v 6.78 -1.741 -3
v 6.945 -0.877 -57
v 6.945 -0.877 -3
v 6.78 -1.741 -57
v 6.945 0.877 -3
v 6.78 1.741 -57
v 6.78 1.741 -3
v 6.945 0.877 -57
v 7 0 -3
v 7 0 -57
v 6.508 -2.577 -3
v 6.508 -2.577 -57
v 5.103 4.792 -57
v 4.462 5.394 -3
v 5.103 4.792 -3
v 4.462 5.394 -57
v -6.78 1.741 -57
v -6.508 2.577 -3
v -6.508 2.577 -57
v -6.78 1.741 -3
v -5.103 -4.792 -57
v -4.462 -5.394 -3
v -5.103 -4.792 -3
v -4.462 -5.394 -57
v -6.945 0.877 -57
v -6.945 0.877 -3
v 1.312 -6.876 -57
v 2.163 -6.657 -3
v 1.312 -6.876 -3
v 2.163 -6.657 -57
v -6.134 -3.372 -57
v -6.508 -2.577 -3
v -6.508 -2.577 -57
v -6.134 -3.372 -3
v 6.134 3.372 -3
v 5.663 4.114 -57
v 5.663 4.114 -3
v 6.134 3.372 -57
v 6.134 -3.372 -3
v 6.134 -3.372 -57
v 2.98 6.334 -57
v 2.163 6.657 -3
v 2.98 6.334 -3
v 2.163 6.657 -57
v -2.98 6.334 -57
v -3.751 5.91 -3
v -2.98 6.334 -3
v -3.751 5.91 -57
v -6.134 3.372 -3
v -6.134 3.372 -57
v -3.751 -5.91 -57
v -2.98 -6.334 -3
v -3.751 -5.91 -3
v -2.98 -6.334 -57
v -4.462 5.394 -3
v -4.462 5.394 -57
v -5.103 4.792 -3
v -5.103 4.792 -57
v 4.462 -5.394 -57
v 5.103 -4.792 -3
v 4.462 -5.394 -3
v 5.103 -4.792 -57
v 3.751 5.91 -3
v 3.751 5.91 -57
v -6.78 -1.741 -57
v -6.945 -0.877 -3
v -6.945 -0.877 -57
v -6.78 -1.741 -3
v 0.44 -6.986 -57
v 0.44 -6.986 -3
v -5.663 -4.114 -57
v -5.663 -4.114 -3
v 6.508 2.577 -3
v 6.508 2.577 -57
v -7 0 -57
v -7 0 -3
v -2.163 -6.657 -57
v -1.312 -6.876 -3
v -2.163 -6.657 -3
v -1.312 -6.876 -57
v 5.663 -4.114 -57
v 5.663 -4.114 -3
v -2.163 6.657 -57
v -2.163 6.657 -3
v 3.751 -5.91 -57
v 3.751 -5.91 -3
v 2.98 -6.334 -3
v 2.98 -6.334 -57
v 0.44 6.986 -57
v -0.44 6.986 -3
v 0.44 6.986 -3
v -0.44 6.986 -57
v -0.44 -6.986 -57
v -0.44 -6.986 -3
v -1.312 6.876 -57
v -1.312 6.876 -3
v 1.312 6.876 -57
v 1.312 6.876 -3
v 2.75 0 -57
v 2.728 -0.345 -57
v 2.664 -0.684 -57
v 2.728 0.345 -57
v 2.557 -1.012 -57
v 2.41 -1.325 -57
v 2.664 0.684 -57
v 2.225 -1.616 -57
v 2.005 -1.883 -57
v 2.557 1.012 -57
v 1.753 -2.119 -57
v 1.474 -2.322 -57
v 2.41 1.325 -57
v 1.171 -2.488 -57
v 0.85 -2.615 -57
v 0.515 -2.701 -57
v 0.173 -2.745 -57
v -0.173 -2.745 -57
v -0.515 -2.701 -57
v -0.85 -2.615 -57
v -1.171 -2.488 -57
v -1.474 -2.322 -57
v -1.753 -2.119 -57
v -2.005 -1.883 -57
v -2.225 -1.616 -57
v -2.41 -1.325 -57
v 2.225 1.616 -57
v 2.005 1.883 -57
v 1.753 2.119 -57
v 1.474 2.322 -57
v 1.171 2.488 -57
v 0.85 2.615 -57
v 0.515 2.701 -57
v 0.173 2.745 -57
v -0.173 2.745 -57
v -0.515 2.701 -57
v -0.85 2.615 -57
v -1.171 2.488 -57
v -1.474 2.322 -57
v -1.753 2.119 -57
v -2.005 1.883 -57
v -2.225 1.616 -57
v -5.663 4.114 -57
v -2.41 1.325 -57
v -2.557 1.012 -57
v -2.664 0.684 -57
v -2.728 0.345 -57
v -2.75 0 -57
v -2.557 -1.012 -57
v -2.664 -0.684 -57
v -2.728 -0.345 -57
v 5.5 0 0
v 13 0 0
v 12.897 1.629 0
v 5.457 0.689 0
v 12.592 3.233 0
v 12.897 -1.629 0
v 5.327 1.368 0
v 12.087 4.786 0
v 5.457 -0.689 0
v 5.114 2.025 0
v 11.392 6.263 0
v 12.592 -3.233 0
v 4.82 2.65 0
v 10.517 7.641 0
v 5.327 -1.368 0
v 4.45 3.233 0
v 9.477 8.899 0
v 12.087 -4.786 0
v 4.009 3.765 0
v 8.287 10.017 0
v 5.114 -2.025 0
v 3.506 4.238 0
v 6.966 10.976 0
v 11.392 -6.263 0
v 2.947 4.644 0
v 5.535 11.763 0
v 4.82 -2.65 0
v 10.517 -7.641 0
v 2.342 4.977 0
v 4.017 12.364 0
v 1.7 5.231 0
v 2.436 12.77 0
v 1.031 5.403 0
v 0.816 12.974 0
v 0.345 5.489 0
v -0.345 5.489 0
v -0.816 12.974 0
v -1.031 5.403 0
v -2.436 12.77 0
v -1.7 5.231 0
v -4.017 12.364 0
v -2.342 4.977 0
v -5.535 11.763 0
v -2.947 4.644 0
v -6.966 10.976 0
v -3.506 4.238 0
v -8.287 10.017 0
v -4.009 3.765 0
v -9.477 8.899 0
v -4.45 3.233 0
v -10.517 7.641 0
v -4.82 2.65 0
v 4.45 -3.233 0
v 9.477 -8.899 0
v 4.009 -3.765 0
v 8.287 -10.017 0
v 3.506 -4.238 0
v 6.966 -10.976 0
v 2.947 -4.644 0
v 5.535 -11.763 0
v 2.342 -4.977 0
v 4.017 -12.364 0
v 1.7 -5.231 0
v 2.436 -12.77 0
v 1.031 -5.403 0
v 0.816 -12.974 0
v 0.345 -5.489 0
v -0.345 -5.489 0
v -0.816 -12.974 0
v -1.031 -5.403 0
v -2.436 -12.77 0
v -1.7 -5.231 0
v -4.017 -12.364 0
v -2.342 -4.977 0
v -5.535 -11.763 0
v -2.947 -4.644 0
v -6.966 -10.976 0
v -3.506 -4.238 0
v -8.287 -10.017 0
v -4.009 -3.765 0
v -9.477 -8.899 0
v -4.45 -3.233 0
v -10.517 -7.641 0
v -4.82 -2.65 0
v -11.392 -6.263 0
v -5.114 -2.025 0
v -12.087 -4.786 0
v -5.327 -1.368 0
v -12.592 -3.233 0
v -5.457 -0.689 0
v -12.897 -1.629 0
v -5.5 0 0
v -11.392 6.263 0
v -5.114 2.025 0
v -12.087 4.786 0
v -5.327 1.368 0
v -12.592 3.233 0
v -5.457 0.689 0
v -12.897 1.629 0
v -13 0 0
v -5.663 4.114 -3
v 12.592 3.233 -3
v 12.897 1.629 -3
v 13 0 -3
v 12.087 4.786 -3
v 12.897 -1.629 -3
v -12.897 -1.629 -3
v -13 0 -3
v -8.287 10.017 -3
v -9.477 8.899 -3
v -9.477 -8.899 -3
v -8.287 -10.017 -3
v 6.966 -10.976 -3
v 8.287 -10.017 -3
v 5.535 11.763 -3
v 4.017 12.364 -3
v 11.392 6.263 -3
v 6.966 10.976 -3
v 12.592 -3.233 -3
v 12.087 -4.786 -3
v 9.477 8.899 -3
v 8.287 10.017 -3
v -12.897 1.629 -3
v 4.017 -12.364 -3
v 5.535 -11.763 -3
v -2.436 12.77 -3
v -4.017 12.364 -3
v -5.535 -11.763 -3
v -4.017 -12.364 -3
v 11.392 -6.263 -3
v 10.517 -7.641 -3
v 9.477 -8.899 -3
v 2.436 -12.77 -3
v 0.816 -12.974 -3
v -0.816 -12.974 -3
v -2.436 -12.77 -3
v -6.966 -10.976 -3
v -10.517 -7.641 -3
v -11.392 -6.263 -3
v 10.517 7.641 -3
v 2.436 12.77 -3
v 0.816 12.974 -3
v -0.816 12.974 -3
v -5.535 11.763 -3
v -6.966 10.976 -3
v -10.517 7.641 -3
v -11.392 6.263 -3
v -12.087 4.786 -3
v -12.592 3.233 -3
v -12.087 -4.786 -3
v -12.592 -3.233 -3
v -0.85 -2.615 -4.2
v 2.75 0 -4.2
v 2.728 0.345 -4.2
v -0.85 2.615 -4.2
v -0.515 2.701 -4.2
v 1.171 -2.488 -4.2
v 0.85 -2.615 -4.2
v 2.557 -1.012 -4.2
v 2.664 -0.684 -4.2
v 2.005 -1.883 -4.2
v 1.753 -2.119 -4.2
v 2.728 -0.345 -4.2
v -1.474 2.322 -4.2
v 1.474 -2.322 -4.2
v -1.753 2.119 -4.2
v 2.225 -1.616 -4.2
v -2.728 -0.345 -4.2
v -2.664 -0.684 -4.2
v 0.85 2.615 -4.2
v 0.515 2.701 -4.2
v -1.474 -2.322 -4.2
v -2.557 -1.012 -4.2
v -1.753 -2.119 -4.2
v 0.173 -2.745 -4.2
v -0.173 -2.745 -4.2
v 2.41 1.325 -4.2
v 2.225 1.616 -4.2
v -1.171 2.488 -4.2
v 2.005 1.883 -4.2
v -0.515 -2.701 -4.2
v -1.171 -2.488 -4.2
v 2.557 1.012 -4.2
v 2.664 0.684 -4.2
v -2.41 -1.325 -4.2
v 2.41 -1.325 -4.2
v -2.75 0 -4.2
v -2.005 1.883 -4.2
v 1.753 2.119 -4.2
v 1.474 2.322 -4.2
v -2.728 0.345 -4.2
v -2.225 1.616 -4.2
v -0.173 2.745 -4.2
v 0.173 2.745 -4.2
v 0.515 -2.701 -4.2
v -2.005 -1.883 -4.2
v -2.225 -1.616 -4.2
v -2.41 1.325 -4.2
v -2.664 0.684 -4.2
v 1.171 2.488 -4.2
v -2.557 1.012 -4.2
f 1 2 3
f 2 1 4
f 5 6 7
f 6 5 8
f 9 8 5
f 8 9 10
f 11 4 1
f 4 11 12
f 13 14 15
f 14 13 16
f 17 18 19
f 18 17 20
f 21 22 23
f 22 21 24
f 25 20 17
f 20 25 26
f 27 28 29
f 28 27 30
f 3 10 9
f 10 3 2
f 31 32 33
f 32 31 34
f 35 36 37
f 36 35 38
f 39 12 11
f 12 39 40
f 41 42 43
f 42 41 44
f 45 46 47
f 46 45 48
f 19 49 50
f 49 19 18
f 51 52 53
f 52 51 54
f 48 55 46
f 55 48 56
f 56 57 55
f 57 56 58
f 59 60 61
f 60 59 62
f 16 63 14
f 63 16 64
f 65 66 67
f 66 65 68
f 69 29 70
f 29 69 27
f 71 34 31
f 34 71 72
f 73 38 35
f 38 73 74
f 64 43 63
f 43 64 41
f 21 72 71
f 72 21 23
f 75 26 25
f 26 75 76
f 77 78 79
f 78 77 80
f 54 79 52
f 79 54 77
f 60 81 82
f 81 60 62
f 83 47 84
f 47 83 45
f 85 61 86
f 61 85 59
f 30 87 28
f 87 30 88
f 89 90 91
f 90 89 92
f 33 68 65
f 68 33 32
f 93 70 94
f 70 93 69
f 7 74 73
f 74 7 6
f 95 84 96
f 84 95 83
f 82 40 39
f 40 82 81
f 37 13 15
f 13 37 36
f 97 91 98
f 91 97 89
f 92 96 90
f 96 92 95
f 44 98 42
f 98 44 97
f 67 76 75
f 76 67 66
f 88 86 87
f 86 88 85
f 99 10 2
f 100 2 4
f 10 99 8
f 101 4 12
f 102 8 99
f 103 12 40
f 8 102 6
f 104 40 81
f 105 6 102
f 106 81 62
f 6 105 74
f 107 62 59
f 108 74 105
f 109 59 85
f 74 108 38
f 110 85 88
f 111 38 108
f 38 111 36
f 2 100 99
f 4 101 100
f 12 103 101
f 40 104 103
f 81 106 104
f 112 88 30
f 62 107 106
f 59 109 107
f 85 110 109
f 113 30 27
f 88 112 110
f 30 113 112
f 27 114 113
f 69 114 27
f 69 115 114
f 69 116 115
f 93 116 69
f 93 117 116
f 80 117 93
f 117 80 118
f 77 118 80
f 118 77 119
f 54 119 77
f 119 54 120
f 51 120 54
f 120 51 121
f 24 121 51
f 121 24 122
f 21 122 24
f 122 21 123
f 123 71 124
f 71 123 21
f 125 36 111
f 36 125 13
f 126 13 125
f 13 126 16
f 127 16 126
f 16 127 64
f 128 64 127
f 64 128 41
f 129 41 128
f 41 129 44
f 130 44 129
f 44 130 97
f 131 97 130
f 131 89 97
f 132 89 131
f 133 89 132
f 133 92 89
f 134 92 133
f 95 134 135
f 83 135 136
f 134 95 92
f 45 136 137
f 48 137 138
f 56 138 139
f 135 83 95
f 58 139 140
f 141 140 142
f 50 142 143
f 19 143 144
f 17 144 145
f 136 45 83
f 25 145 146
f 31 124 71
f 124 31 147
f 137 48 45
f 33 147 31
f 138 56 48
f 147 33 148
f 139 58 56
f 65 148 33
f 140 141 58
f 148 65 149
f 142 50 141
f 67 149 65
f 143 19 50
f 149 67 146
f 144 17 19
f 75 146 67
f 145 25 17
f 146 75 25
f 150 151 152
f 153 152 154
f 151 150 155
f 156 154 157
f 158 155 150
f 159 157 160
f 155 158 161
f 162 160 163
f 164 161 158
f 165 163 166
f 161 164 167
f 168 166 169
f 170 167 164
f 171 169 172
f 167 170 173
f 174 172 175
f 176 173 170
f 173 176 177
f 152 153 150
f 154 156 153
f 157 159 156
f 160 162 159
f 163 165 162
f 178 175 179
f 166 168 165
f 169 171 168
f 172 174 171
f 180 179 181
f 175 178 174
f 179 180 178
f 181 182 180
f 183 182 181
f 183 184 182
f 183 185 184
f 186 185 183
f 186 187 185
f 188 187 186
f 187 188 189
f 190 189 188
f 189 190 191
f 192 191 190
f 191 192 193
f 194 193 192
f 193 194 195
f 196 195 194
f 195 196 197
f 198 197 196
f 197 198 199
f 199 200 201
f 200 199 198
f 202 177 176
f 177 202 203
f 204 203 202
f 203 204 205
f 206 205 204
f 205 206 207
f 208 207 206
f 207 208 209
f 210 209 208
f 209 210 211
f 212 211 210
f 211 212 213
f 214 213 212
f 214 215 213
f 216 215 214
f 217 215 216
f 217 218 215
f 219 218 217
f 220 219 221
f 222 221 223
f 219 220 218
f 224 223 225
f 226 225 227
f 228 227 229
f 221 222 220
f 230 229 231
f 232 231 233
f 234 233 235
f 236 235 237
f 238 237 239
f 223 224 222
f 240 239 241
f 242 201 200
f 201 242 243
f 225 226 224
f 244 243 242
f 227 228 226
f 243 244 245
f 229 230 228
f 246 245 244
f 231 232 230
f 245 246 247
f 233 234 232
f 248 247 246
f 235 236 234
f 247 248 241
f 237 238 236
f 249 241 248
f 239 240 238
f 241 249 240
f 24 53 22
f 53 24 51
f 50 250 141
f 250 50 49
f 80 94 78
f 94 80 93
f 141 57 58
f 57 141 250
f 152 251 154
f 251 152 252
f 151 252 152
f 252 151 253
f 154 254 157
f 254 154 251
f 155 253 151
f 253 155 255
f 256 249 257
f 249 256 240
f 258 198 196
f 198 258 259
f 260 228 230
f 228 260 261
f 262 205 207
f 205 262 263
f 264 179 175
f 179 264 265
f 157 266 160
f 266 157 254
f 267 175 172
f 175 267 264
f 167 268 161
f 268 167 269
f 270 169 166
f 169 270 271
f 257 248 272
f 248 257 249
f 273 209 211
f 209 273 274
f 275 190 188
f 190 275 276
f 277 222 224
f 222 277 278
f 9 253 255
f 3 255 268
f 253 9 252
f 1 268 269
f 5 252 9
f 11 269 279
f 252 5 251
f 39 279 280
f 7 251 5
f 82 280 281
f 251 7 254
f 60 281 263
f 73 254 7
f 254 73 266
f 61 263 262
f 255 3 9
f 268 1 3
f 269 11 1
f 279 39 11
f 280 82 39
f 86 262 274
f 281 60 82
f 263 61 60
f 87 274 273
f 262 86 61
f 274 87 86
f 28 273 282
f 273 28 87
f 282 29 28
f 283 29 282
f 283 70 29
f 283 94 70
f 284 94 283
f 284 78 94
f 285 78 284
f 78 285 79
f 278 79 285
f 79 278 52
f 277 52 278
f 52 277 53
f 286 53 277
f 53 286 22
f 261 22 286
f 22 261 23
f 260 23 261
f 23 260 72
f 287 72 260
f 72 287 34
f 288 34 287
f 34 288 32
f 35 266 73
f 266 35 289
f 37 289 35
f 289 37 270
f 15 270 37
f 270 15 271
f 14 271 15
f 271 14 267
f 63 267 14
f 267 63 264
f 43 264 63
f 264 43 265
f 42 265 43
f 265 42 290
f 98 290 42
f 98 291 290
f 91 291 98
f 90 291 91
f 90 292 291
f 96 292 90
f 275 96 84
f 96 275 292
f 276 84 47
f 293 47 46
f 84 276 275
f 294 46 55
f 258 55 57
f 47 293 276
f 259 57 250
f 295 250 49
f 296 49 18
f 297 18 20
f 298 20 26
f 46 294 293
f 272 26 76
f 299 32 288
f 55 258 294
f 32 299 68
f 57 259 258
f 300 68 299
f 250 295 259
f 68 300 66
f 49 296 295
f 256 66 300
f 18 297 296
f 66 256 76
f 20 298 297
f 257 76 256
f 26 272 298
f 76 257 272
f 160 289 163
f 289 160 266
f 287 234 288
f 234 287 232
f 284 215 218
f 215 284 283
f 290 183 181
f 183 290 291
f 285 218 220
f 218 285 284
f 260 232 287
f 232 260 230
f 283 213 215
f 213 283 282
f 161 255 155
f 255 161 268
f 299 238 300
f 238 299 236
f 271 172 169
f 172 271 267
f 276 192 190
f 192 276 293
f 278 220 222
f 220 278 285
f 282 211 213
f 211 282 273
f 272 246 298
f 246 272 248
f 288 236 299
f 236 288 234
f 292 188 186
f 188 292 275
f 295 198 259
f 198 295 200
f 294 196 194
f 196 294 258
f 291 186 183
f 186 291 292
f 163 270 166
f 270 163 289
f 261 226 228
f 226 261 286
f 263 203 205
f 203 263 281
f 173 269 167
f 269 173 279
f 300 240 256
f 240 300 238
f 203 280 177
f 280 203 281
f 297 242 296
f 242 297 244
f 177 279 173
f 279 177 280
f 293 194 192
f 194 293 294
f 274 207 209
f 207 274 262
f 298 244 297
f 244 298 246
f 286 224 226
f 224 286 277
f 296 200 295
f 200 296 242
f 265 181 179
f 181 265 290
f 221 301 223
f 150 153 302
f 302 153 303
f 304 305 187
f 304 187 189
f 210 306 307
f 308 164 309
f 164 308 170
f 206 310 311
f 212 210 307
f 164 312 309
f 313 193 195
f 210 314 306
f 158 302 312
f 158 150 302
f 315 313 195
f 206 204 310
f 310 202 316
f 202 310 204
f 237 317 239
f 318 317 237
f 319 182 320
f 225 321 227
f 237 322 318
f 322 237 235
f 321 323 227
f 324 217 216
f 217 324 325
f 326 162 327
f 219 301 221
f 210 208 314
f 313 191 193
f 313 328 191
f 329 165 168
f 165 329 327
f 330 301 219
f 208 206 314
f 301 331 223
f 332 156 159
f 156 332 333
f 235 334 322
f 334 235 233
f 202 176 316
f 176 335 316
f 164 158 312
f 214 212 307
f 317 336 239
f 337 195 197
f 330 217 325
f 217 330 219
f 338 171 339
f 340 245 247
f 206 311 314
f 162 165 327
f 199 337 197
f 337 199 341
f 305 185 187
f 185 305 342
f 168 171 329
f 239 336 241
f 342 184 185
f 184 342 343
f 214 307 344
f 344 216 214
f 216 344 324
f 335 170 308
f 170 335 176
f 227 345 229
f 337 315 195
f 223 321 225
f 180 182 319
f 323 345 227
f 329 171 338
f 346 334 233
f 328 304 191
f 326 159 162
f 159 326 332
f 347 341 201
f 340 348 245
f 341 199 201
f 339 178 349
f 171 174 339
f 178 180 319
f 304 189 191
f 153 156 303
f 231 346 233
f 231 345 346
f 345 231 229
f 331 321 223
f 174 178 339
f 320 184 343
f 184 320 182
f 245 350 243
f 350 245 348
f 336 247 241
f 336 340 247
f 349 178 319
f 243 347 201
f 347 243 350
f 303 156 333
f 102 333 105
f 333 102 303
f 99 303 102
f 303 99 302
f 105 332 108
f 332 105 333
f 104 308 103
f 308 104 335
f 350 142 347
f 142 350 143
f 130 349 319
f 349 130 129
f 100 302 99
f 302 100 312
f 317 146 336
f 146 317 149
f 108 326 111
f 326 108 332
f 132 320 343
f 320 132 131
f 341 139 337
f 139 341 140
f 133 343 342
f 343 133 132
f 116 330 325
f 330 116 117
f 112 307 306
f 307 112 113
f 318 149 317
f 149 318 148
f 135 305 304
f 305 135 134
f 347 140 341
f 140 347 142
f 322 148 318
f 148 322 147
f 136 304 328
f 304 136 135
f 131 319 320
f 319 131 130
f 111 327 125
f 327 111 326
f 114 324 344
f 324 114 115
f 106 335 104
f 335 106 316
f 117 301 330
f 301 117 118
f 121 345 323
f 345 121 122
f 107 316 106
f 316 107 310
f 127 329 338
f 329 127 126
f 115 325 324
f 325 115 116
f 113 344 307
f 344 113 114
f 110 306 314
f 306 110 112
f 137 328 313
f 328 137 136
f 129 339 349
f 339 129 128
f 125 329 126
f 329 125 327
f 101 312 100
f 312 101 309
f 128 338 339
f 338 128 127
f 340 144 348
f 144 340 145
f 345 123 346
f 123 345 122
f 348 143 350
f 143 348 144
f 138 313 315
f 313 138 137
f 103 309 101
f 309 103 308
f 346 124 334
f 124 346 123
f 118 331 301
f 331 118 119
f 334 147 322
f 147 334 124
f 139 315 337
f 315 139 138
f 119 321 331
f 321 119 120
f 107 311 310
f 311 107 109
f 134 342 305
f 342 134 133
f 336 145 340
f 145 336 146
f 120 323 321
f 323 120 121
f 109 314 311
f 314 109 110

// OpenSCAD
$fn = 50;


difference() {
	union() {
		translate(v = [0, 0, -57.0000000000]) {
			cylinder(h = 57, r = 7.0000000000);
		}
		translate(v = [0, 0, -3.0000000000]) {
			cylinder(h = 3, r = 13.0000000000);
		}
	}
	union() {
		translate(v = [0, 0, 0]) {
			rotate(a = [0, 0, 0]) {
				difference() {
					union() {
						#translate(v = [0, 0, -57.0000000000]) {
							cylinder(h = 57, r = 2.2500000000);
						}
						#translate(v = [0, 0, -4.2000000000]) {
							cylinder(h = 4.2000000000, r = 7.0000000000, r1 = 2.7500000000, r2 = 5.5000000000);
						}
						#translate(v = [0, 0, -57.0000000000]) {
							cylinder(h = 57, r = 2.7500000000);
						}
						#translate(v = [0, 0, -57.0000000000]) {
							cylinder(h = 57, r = 2.2500000000);
						}
					}
					union();
				}
			}
		}
	}
}
